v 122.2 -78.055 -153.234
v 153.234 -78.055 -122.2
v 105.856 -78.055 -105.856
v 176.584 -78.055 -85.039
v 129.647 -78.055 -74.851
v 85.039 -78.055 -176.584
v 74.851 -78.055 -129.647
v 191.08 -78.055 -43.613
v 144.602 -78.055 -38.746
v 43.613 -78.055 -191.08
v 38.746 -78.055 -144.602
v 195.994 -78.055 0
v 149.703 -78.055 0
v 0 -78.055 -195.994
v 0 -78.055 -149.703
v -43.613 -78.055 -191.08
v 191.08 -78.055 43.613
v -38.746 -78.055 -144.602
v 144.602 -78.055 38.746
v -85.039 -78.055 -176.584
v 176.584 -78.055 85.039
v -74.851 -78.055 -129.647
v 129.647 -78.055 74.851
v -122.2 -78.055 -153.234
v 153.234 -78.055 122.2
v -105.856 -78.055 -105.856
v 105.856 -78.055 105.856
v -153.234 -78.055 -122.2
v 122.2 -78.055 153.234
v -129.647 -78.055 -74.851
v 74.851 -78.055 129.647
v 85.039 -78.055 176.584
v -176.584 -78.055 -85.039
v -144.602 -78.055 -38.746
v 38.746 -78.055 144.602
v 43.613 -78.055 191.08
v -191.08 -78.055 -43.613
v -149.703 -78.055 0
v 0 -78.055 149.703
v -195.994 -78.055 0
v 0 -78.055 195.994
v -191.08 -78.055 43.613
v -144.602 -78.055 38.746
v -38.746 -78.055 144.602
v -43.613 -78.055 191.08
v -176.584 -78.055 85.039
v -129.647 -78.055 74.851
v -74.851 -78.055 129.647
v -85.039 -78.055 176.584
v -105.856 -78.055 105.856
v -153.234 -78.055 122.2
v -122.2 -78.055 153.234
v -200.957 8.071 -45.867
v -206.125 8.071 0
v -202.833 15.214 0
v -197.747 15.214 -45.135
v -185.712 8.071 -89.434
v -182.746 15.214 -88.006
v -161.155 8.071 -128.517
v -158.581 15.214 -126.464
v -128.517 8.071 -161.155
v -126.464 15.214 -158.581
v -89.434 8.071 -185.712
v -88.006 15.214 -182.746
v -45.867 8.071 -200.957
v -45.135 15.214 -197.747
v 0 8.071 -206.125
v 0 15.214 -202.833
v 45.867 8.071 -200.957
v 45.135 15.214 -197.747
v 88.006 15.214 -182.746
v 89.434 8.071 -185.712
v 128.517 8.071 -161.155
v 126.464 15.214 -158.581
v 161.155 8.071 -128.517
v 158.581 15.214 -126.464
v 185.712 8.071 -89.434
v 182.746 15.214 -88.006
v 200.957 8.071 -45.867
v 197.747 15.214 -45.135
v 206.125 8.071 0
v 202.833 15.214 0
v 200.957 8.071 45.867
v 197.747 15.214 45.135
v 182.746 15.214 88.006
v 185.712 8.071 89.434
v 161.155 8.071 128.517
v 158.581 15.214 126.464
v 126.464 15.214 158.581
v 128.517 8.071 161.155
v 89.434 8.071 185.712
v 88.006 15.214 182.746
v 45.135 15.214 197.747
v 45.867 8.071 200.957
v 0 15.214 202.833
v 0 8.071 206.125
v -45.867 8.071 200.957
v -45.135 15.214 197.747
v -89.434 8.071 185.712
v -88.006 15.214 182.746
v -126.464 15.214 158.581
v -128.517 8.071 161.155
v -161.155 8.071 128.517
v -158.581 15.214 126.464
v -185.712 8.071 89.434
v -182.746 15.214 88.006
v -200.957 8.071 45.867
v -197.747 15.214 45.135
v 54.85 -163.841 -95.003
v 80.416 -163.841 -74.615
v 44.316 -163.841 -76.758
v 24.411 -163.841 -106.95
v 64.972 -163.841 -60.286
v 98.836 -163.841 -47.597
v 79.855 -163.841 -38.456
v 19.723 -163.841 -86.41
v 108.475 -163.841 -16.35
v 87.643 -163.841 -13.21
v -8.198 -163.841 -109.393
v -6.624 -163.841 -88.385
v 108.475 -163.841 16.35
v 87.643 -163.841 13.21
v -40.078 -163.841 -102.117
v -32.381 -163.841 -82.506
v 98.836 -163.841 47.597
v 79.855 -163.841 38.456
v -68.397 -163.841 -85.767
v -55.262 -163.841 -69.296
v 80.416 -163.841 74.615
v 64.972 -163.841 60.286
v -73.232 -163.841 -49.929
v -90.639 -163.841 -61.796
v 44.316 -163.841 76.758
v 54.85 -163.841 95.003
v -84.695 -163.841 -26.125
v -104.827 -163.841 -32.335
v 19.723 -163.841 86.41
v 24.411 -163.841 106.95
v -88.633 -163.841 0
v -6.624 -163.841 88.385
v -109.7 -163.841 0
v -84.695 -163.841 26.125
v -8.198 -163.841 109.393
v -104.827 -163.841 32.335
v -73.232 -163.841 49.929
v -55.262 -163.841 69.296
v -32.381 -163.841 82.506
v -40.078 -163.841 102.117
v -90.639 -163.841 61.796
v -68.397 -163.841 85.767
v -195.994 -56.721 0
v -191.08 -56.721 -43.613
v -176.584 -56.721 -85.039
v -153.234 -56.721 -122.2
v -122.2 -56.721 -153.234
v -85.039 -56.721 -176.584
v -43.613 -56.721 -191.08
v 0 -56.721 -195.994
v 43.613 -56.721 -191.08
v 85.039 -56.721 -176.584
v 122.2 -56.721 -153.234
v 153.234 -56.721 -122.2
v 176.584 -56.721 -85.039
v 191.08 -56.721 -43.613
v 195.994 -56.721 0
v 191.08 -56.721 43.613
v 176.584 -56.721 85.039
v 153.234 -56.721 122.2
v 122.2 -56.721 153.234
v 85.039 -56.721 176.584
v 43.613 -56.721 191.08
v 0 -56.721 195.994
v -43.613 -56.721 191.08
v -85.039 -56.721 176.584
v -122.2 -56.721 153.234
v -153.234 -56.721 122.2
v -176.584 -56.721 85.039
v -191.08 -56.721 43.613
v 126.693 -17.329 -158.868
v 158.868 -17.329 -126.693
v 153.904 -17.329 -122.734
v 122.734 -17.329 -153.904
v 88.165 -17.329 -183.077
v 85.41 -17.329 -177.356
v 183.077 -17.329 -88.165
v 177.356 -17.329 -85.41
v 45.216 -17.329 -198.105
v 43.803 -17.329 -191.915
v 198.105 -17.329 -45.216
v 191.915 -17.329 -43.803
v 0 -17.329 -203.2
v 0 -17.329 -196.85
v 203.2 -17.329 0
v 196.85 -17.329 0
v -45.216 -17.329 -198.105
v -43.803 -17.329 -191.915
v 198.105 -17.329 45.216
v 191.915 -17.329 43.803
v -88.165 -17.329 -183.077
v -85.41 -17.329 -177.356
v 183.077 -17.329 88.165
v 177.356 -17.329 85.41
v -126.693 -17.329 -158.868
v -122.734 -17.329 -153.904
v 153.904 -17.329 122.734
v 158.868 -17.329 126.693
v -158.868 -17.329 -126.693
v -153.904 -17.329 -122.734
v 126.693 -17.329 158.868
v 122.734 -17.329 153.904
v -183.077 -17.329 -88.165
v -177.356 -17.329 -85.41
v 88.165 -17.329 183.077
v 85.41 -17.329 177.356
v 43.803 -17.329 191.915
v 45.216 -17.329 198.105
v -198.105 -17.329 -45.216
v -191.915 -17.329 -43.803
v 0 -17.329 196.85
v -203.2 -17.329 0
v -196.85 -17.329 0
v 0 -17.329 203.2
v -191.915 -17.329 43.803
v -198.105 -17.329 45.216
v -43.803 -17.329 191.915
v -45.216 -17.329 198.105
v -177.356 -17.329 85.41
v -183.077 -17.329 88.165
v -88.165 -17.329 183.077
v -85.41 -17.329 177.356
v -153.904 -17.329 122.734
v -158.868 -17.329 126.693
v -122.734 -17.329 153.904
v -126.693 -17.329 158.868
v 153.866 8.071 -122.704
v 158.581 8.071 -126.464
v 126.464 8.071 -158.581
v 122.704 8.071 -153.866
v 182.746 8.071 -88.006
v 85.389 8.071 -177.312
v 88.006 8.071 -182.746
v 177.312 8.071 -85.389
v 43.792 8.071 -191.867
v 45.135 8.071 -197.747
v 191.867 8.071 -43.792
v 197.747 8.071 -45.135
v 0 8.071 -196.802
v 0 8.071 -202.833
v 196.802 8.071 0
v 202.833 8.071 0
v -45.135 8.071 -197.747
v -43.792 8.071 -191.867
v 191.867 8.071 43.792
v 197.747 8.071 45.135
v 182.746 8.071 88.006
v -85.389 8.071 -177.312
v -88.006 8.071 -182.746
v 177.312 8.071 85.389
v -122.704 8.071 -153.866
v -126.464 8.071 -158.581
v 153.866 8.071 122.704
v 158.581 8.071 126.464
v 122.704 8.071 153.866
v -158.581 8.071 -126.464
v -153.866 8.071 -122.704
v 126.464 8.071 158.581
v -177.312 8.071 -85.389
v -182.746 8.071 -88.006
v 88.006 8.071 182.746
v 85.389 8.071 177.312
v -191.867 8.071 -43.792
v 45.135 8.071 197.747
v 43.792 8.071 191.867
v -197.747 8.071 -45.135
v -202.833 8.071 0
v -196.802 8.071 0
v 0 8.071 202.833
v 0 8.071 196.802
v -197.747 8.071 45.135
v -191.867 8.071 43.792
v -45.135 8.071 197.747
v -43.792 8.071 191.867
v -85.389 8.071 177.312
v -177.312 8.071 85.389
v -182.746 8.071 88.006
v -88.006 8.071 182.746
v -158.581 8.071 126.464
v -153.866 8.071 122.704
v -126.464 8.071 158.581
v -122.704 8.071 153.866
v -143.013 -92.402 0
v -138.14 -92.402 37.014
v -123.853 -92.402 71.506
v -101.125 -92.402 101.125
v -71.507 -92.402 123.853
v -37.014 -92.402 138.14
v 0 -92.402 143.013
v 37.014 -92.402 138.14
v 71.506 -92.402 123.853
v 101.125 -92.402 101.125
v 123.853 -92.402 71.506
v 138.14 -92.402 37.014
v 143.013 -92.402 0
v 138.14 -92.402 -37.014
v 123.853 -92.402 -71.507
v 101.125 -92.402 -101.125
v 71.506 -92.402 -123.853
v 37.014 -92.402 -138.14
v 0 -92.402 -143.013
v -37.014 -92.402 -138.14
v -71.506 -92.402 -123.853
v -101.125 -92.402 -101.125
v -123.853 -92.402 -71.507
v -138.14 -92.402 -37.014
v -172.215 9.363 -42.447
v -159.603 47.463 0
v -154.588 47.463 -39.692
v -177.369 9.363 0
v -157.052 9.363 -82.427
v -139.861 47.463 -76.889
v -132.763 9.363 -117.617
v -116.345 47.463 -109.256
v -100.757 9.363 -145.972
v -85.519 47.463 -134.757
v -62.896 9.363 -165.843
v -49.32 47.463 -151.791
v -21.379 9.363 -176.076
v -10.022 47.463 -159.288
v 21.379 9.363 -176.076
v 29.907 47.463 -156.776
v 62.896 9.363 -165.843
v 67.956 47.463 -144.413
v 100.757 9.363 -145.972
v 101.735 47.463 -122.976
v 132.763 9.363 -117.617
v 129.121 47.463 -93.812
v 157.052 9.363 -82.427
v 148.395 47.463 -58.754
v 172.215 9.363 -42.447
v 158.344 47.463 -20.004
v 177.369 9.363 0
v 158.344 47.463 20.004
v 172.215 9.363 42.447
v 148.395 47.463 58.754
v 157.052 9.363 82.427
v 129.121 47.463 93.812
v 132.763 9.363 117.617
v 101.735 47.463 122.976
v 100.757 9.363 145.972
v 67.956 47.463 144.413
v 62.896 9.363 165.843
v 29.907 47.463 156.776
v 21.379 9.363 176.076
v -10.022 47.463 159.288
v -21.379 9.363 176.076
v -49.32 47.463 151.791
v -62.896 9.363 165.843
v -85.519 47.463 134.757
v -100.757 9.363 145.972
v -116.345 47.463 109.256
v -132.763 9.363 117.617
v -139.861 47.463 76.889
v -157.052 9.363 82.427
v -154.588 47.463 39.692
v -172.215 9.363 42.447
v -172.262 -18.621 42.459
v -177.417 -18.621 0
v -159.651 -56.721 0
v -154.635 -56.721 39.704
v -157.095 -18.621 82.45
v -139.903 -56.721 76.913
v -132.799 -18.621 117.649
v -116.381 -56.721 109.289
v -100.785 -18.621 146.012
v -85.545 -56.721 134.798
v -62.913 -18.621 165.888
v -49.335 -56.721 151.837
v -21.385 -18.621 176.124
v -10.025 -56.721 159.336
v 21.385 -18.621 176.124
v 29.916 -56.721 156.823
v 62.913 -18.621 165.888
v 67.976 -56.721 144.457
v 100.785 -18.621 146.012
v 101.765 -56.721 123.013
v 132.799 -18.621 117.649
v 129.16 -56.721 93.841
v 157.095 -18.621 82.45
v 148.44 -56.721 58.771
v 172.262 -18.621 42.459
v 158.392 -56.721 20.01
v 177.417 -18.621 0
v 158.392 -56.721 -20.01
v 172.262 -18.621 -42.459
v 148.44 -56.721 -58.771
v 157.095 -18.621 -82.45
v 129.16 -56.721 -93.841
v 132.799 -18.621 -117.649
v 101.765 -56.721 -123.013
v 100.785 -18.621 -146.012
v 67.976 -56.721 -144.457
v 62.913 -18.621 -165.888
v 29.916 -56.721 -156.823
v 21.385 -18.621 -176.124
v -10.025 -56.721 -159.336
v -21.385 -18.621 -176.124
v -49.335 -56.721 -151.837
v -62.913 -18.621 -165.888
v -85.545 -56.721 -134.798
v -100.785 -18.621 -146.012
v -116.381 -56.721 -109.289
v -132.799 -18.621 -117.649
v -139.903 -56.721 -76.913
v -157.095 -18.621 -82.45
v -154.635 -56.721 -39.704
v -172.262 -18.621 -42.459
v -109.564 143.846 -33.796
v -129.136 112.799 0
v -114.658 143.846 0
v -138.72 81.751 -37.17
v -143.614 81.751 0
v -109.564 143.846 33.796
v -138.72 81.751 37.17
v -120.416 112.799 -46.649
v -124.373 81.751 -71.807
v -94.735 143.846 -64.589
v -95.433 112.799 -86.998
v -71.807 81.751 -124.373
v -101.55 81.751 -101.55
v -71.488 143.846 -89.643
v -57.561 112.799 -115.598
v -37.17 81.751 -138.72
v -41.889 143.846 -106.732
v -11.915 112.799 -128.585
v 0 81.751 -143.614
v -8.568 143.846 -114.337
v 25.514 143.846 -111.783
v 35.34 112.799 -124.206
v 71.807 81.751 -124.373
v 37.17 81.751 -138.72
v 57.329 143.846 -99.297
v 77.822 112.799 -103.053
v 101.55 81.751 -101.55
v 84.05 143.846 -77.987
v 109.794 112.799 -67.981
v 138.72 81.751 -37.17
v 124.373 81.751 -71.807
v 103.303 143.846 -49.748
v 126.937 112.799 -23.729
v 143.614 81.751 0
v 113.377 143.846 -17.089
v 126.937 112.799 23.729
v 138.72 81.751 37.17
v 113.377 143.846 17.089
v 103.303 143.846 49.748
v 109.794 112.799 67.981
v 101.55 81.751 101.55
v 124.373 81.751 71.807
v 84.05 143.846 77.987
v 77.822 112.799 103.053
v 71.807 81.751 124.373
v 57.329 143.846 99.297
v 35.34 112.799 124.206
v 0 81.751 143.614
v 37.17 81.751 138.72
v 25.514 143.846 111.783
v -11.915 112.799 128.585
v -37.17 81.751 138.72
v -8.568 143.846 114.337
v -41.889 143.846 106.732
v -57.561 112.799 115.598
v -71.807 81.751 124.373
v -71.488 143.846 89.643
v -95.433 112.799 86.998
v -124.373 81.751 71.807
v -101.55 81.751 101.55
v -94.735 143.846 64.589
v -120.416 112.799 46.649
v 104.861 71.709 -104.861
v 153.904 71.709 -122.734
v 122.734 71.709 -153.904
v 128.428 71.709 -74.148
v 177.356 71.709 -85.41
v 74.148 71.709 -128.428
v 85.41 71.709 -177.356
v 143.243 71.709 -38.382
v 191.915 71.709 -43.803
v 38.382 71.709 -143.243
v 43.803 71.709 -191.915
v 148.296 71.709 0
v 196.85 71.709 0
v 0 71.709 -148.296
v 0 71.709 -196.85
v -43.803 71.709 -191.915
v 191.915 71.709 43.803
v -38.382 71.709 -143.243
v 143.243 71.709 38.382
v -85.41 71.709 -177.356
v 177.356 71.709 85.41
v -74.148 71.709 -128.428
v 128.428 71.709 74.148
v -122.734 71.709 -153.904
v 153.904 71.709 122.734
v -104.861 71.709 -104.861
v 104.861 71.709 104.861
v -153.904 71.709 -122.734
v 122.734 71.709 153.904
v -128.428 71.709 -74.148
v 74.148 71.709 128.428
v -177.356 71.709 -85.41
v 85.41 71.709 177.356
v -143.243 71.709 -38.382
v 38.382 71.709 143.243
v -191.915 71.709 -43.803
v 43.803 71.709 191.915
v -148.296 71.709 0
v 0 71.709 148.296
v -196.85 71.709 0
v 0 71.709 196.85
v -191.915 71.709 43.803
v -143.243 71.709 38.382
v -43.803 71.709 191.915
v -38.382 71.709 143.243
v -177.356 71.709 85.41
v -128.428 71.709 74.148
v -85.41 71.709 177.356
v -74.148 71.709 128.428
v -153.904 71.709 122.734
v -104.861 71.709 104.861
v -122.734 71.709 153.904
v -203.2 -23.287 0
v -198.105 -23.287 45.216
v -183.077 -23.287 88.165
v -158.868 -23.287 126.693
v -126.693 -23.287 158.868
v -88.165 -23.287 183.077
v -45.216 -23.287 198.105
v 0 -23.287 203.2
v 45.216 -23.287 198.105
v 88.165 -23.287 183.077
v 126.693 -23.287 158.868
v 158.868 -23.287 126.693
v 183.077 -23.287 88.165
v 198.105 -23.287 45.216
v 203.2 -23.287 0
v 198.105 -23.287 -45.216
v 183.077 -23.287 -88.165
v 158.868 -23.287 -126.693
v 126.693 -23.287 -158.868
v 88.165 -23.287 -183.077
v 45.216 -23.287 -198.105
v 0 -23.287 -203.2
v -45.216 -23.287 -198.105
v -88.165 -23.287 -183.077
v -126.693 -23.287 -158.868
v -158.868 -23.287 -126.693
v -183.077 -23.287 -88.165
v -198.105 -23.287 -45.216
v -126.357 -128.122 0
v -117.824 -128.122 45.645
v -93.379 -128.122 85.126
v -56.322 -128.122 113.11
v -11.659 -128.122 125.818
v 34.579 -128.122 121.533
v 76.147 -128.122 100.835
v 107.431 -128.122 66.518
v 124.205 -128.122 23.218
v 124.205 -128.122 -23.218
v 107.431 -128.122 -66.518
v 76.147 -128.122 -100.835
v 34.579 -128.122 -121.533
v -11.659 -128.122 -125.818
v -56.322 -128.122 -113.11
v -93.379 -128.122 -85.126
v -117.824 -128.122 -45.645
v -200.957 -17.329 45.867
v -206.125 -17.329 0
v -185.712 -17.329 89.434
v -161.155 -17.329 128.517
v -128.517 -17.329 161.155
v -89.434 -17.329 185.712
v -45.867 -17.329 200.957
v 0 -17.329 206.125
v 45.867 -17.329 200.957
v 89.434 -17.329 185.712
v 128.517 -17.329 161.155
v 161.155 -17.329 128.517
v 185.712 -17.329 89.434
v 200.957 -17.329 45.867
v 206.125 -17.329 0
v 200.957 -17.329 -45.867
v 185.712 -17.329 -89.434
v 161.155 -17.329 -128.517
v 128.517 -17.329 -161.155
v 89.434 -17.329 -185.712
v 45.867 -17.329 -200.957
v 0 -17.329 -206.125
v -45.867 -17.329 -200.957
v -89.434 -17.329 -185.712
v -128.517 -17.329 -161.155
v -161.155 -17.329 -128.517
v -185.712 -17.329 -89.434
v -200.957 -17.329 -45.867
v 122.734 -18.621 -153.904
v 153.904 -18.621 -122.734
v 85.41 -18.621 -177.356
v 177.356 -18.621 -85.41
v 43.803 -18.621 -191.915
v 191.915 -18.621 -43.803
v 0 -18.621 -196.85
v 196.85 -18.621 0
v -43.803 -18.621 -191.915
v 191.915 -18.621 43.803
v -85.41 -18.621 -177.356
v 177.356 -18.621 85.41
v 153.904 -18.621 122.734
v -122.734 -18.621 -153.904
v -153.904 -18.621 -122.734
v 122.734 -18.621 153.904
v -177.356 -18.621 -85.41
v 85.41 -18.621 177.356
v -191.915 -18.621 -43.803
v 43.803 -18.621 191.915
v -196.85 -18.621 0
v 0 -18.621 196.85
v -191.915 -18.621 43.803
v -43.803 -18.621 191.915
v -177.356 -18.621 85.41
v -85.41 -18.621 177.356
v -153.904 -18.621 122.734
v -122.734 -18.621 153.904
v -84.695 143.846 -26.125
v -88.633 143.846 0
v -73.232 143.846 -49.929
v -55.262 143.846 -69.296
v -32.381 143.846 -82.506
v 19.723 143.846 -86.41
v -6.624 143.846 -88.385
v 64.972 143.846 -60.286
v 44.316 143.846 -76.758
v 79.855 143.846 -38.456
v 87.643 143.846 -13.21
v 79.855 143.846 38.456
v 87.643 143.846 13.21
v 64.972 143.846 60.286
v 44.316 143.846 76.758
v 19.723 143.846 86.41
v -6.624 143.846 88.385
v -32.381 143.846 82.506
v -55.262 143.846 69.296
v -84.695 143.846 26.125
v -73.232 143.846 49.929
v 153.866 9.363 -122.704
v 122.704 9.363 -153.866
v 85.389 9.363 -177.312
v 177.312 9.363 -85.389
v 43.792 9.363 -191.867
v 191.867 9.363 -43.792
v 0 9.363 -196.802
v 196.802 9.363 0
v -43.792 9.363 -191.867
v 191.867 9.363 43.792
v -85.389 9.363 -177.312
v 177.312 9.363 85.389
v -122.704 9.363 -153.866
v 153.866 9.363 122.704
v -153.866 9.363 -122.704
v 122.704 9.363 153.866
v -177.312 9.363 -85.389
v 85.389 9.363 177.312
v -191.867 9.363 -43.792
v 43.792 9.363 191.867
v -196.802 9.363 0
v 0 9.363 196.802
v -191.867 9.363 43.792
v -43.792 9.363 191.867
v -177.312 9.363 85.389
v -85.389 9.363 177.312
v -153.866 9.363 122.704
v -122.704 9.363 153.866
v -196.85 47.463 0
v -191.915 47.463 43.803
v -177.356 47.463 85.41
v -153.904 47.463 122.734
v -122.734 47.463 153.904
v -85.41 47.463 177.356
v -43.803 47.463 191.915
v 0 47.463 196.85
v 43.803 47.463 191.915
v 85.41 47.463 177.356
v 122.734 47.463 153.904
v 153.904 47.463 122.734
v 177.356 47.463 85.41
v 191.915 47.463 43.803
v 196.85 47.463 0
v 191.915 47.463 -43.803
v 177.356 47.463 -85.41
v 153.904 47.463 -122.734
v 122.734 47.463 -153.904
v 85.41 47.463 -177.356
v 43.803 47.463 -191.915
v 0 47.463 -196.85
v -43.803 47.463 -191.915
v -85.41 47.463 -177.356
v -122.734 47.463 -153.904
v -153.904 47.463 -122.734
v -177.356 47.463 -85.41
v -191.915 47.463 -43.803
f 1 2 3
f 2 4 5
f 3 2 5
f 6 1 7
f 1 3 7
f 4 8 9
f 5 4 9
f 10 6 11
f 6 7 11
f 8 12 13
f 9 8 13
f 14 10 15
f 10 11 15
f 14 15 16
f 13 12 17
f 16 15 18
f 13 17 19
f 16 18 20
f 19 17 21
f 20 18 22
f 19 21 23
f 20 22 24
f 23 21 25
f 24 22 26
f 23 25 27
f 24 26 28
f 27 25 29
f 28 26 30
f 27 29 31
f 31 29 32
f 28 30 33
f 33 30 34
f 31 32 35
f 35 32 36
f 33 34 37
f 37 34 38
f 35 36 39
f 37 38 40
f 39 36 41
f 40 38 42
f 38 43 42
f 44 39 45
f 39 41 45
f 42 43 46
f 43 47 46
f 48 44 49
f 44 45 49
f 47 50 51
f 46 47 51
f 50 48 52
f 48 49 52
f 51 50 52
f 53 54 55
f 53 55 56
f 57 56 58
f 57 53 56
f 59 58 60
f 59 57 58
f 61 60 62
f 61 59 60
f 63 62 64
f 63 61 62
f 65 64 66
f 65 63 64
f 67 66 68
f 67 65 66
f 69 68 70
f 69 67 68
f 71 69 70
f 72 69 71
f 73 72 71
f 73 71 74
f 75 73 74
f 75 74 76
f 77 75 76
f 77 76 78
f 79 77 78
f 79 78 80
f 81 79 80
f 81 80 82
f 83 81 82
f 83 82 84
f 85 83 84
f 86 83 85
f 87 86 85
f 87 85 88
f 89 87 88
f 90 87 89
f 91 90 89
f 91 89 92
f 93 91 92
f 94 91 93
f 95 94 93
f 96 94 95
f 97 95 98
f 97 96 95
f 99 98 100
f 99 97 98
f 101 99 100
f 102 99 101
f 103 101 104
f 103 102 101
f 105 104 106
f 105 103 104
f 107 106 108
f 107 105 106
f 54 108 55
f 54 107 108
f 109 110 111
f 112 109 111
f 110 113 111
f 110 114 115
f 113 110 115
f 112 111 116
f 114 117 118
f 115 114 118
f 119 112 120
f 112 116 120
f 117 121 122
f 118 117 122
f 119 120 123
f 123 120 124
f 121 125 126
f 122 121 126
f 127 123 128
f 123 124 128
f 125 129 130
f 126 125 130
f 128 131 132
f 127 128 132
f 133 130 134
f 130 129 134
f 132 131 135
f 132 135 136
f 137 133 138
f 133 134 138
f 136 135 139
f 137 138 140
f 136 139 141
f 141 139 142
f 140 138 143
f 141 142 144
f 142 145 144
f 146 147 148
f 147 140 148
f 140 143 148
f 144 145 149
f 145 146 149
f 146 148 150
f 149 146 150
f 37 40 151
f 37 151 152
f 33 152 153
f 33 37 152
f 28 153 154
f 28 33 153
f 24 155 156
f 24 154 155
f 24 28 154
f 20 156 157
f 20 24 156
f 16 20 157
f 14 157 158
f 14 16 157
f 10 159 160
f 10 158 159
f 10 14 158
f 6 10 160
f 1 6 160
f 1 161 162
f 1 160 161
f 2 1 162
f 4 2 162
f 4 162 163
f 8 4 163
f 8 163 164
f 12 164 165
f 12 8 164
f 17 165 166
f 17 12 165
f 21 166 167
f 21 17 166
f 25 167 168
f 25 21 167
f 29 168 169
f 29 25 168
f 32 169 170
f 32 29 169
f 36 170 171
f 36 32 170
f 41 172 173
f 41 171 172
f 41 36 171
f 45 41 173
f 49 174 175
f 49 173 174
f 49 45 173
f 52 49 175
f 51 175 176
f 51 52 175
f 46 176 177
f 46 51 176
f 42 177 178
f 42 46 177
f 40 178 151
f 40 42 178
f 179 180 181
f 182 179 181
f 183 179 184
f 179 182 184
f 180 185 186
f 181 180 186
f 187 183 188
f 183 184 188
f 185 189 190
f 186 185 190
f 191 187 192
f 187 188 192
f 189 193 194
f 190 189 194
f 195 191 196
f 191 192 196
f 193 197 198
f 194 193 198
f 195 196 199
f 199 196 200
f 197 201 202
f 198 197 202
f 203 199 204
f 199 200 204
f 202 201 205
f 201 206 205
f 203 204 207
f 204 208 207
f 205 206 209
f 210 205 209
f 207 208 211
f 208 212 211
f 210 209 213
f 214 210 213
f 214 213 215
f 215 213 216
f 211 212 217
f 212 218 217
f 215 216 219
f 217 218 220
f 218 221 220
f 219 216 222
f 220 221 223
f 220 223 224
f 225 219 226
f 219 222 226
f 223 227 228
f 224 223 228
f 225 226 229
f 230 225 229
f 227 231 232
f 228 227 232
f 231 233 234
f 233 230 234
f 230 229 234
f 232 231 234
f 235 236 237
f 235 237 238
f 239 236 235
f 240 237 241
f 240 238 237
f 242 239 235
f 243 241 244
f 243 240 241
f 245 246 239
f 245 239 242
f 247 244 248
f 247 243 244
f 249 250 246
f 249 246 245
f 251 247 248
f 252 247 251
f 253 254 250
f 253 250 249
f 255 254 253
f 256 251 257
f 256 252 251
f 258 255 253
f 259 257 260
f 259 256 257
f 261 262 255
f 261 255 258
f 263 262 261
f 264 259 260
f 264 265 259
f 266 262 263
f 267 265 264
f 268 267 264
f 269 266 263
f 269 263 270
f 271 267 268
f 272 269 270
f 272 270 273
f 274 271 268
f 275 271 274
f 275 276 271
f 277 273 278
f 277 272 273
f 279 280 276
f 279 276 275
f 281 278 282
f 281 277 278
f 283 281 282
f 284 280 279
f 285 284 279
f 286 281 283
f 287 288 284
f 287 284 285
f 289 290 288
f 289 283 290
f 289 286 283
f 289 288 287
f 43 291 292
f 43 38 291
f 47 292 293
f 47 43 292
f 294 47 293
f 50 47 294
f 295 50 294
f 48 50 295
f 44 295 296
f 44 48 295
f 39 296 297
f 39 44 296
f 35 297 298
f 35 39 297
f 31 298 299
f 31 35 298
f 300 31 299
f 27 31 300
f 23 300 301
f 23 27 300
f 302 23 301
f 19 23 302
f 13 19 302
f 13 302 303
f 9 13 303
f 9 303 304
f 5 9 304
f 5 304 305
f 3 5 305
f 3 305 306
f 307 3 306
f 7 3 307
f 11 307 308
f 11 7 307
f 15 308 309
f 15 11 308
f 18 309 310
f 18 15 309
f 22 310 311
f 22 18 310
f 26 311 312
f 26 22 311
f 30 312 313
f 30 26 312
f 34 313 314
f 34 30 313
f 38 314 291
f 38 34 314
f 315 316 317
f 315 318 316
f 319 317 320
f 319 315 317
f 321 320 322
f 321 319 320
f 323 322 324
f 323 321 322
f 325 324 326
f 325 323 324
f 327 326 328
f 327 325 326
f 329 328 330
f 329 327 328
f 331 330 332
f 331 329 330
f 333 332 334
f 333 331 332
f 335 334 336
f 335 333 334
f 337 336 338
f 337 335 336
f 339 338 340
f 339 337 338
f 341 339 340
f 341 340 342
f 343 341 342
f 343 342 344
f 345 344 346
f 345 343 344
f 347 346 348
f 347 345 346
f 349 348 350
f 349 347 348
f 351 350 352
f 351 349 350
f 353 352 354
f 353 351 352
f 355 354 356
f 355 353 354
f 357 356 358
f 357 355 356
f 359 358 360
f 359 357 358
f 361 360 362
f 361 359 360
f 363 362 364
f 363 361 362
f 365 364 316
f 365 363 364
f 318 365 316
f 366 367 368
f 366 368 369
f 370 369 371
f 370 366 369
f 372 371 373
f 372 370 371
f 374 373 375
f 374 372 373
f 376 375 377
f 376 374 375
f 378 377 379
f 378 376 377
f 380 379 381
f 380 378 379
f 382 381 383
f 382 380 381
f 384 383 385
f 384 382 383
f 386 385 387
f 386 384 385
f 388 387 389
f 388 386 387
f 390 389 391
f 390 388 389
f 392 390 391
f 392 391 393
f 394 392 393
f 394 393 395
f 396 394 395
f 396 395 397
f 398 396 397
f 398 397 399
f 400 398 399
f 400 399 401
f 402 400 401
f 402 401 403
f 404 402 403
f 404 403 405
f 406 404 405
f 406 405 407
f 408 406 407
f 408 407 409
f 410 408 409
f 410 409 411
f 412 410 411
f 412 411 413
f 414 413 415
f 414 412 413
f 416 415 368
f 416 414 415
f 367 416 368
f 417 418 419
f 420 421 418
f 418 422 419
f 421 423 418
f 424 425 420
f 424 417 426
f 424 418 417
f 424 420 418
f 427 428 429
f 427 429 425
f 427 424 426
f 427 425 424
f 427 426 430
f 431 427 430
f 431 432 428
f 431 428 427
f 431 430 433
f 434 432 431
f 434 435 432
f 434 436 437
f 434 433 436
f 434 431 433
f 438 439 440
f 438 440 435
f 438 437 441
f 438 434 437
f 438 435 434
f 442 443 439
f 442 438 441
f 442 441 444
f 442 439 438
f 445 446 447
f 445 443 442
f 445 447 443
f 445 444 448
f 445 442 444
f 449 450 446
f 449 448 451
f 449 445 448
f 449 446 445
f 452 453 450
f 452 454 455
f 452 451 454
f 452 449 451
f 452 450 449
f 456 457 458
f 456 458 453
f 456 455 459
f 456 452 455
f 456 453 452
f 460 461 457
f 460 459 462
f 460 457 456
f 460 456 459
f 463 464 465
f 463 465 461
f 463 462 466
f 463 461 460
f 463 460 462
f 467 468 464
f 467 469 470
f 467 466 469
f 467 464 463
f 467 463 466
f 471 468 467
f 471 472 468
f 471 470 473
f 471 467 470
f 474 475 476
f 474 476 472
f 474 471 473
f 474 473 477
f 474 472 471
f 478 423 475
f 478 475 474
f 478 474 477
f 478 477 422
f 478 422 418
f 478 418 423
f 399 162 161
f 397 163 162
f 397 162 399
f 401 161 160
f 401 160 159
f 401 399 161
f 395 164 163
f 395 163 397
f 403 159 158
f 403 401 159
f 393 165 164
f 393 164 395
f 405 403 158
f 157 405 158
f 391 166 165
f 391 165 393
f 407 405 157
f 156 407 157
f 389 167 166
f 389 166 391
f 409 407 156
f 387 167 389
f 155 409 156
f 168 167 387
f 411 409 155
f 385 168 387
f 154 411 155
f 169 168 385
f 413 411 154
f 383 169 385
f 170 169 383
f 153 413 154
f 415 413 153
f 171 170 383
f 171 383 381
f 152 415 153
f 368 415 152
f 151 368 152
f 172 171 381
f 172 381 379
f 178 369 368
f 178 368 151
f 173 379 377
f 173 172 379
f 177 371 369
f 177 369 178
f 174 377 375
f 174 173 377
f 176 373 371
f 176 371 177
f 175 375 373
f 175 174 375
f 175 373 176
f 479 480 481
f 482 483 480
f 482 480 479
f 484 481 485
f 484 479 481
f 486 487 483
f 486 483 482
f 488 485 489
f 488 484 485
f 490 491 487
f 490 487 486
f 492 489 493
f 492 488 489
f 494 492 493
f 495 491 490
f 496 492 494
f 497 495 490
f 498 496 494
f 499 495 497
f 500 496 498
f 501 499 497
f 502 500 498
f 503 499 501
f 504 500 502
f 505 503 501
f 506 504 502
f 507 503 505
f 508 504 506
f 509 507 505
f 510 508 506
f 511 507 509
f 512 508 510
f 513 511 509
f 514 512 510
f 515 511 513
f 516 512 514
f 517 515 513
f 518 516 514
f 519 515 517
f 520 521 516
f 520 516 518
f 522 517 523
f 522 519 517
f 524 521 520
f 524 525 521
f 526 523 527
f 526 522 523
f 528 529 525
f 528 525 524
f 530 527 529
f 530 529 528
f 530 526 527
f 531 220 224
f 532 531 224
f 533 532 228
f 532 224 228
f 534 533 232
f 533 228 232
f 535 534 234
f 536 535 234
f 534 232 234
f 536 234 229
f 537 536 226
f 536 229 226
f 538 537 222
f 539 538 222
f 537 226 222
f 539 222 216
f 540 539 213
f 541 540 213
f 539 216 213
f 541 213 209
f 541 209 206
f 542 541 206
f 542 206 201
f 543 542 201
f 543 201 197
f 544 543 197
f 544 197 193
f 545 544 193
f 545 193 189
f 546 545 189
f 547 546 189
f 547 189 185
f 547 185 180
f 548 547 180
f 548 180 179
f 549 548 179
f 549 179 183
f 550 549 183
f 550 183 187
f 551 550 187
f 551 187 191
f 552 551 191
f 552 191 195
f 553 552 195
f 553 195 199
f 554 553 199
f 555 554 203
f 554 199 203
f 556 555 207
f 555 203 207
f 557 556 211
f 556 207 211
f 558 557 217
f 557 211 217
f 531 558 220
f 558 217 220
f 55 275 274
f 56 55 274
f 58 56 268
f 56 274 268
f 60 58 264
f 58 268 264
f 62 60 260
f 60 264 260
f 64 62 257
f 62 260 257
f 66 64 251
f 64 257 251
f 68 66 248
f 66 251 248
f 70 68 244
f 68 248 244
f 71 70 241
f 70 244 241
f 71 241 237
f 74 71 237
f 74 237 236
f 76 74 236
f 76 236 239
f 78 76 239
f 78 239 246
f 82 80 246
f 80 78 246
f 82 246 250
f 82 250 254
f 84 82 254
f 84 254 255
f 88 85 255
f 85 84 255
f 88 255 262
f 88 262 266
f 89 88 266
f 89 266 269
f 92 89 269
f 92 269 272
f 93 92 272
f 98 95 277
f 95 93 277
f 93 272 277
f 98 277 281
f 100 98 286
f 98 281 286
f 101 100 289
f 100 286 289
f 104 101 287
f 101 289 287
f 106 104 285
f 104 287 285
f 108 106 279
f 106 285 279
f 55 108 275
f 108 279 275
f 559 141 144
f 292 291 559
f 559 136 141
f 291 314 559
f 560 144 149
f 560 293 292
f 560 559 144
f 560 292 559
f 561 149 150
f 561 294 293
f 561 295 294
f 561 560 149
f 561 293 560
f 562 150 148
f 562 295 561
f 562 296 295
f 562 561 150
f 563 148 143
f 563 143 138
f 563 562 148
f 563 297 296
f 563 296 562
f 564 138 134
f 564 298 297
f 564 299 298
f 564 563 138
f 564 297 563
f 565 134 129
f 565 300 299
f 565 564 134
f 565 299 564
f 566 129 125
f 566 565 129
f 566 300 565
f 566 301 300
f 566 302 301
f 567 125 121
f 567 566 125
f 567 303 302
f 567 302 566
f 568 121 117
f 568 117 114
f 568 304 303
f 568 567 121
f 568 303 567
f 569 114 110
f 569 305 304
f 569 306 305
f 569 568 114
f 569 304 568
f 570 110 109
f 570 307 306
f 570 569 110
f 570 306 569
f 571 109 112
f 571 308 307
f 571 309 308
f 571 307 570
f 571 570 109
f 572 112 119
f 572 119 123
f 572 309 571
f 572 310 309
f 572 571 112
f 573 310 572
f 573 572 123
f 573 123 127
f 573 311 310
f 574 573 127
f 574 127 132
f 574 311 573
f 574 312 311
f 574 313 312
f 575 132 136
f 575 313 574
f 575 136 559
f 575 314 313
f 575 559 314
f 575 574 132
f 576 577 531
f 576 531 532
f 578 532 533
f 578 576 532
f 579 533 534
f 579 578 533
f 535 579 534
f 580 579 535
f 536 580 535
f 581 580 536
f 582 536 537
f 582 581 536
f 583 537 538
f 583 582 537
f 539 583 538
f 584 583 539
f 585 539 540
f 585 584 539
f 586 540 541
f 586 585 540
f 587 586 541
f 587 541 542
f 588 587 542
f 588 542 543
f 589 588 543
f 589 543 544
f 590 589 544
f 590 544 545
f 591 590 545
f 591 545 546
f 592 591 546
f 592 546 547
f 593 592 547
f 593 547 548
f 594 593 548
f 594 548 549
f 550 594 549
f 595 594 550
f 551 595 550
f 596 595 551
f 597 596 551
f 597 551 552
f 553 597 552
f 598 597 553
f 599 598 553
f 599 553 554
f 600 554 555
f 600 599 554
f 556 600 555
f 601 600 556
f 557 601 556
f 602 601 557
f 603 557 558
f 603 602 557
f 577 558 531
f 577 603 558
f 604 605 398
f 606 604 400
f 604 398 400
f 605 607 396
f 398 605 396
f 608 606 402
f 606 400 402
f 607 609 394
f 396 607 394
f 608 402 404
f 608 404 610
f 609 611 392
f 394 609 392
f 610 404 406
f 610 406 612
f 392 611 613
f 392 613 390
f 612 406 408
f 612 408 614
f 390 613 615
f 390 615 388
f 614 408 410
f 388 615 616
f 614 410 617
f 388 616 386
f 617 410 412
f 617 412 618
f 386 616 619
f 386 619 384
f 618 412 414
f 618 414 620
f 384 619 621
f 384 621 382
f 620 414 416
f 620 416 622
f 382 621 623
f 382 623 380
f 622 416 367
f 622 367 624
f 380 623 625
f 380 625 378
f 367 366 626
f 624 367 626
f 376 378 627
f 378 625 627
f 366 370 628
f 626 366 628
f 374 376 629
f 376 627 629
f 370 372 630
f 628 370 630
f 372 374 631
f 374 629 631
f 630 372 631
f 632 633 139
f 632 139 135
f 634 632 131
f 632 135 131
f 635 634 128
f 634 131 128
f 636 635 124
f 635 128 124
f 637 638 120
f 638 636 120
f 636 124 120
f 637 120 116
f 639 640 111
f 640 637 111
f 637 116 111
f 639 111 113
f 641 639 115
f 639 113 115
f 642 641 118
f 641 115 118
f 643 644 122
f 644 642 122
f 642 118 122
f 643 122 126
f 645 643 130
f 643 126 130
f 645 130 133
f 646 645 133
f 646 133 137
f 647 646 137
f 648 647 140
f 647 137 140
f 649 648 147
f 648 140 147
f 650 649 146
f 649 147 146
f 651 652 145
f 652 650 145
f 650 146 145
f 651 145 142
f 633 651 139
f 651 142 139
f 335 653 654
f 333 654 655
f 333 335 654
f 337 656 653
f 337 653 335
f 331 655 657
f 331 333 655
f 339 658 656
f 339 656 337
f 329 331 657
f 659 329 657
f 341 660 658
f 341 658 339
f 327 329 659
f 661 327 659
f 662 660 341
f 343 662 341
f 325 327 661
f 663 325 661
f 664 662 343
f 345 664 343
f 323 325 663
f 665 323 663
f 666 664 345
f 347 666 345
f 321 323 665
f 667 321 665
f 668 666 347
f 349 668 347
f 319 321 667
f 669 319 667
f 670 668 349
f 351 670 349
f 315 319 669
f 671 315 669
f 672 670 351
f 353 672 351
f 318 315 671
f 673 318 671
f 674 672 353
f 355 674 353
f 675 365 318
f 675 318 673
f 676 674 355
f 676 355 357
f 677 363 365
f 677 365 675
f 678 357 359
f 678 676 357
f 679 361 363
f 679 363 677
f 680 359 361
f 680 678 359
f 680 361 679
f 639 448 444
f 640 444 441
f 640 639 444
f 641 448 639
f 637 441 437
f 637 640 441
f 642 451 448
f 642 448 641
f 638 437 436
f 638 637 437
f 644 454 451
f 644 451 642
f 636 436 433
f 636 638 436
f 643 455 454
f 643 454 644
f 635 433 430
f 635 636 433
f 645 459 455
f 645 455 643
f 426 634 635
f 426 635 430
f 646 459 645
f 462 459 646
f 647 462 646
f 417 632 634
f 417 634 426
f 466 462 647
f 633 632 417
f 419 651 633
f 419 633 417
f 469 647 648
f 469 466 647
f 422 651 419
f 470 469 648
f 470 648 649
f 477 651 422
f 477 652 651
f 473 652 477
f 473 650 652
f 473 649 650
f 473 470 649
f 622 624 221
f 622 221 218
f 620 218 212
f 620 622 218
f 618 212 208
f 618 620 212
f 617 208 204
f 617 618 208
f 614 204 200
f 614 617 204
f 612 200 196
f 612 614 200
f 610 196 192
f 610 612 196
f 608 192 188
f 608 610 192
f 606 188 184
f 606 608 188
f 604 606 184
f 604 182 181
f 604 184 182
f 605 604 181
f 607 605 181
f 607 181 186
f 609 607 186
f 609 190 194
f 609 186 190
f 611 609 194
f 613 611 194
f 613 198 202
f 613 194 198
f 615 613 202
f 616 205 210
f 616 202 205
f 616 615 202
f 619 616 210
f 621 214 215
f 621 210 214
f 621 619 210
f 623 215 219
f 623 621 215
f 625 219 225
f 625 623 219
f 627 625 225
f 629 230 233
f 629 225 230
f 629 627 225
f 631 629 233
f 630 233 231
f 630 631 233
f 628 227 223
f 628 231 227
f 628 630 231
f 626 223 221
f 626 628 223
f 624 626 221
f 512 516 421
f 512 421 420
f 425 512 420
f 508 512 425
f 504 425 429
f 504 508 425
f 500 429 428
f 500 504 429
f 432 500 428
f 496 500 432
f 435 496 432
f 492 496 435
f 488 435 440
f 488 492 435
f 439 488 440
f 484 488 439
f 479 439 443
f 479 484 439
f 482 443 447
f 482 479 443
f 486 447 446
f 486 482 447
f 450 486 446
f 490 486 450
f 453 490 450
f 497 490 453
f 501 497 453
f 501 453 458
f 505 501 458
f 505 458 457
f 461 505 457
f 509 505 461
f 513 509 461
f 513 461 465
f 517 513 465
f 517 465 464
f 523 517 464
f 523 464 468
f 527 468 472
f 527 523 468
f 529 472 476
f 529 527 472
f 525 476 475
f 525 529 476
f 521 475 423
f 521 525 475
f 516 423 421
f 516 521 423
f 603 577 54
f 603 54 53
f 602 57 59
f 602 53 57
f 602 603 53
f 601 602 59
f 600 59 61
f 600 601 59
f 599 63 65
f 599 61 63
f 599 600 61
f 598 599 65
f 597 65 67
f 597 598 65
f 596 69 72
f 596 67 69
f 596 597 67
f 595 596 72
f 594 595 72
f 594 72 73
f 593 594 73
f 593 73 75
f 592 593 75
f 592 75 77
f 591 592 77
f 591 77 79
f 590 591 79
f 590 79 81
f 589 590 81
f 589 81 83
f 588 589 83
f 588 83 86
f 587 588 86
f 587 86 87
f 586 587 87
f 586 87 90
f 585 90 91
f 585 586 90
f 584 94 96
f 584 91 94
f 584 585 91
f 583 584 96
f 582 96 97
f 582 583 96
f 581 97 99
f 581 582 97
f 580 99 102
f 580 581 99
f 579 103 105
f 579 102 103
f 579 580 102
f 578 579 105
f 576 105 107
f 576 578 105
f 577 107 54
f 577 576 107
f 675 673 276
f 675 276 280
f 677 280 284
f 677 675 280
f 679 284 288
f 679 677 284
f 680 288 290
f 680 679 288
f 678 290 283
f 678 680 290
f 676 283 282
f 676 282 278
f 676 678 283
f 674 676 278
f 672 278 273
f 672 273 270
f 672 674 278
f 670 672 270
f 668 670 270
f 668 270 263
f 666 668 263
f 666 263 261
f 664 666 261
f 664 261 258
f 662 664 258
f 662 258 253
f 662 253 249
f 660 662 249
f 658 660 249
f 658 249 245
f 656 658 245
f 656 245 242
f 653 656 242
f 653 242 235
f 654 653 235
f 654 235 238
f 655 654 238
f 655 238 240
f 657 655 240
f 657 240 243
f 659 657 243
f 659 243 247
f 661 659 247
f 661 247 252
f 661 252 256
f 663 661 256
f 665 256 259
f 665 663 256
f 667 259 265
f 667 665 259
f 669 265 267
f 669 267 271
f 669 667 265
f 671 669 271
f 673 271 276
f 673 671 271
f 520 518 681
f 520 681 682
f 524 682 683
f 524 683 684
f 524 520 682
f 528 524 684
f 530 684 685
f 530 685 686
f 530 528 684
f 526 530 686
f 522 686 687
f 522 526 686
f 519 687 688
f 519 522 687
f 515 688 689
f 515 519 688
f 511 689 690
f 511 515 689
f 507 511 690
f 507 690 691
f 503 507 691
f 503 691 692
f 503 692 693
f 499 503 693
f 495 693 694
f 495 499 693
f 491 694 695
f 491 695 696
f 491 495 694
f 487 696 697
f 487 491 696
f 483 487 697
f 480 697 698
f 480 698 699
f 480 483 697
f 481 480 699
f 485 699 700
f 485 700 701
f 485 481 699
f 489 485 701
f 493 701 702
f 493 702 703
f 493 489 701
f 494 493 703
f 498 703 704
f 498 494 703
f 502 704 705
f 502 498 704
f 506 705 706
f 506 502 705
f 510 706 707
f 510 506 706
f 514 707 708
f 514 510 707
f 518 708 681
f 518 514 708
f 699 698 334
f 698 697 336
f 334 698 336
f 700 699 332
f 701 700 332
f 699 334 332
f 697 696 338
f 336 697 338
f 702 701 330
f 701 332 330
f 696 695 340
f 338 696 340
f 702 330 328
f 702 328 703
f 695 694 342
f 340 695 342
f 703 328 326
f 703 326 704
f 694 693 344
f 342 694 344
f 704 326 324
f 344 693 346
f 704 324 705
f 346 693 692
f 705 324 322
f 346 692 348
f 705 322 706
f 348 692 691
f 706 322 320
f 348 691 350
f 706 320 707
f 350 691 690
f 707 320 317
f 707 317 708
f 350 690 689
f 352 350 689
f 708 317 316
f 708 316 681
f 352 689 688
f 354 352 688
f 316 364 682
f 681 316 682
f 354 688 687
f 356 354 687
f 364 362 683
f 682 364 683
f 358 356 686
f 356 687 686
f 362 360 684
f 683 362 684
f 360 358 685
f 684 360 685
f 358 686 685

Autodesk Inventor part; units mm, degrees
ref_plane "YZ Plane" through (0, 0, 0) normal (1, 0, 0) x (0, 1, 0)
ref_plane "XZ Plane" through (0, 0, 0) normal (0, 1, 0) x (-1, 0, 0)
ref_plane "XY Plane" through (0, 0, 0) normal (0, 0, 1) x (1, 0, 0)
sketch "Sketch1" plane through (0, 0, 0) normal (0, 0, 1) x (1, 0, 0)
  line L0 (0, 0) -> (0, 25.4713) construction
  line L1 (-206.1253, 8.0706) -> (-206.1253, -17.3294)
  line L2 (-206.1253, -17.3294) -> (-203.2, -23.287)
  line L3 (-203.2, -23.287) -> (-203.2, -17.3294)
  line L4 (-203.2, -17.3294) -> (-196.85, -17.3294)
  line L5 (-196.85, -17.3294) -> (-196.85, -18.6213)
  line L6 (-206.1253, 8.0706) -> (-202.8327, 15.2137)
  line L7 (-202.8327, 15.2137) -> (-202.8327, 8.0706)
  line L8 (-202.8327, 8.0706) -> (-196.8015, 8.0706)
  line L9 (-196.8015, 8.0706) -> (-196.8015, 9.3626)
  line L10 (-196.8015, 9.3626) -> (-177.369, 9.3626)
  line L11 (-196.85, -18.6213) -> (-177.4174, -18.6213)
  line L12 (-159.6027, 47.4626) -> (-196.85, 47.4626)
  line L13 (-196.85, 47.4626) -> (-196.85, 71.7094)
  line L14 (-196.85, 71.7094) -> (-148.2962, 71.7094)
  line L15 (-159.6511, -56.7213) -> (-195.9938, -56.7213)
  line L16 (-195.9938, -56.7213) -> (-195.9938, -78.0553)
  line L17 (-195.9938, -78.0553) -> (-149.7029, -78.0553)
  line L18 (-177.369, 9.3626) -> (-159.6027, 47.4626)
  line L19 (-148.2962, 71.7094) -> (-143.6137, 81.751)
  line L20 (-177.4174, -18.6213) -> (-159.6511, -56.7213)
  line L21 (-149.7029, -78.0553) -> (-143.013, -92.4018)
  line L22 (-143.6137, 81.751) -> (-114.6581, 143.8464)
  line L23 (-143.013, -92.4018) -> (-109.7002, -163.8414)
  line L24 (-114.6581, 143.8464) -> (-88.6327, 143.8464)
  line L25 (-88.6327, 143.8464) -> (-88.6327, -163.8414)
  line L26 (-88.6327, -163.8414) -> (-109.7002, -163.8414)
  dimension "d0" = 6.35
  dimension "d3" = 203.2
  dimension "d11" = 38.1
  dimension "d12" = 38.1
  dimension "d13" = 0
  dimension "d14" = 25.4
  dimension "d15" = 0
  dimension "d16" = 115
  dimension "d17" = 115
revolve "Revolution1" add sketch "Sketch1" angle 360 about axis through (0, 0, 0) along (0, 1, 0)
properties part number "Section Adaptor WIP"
